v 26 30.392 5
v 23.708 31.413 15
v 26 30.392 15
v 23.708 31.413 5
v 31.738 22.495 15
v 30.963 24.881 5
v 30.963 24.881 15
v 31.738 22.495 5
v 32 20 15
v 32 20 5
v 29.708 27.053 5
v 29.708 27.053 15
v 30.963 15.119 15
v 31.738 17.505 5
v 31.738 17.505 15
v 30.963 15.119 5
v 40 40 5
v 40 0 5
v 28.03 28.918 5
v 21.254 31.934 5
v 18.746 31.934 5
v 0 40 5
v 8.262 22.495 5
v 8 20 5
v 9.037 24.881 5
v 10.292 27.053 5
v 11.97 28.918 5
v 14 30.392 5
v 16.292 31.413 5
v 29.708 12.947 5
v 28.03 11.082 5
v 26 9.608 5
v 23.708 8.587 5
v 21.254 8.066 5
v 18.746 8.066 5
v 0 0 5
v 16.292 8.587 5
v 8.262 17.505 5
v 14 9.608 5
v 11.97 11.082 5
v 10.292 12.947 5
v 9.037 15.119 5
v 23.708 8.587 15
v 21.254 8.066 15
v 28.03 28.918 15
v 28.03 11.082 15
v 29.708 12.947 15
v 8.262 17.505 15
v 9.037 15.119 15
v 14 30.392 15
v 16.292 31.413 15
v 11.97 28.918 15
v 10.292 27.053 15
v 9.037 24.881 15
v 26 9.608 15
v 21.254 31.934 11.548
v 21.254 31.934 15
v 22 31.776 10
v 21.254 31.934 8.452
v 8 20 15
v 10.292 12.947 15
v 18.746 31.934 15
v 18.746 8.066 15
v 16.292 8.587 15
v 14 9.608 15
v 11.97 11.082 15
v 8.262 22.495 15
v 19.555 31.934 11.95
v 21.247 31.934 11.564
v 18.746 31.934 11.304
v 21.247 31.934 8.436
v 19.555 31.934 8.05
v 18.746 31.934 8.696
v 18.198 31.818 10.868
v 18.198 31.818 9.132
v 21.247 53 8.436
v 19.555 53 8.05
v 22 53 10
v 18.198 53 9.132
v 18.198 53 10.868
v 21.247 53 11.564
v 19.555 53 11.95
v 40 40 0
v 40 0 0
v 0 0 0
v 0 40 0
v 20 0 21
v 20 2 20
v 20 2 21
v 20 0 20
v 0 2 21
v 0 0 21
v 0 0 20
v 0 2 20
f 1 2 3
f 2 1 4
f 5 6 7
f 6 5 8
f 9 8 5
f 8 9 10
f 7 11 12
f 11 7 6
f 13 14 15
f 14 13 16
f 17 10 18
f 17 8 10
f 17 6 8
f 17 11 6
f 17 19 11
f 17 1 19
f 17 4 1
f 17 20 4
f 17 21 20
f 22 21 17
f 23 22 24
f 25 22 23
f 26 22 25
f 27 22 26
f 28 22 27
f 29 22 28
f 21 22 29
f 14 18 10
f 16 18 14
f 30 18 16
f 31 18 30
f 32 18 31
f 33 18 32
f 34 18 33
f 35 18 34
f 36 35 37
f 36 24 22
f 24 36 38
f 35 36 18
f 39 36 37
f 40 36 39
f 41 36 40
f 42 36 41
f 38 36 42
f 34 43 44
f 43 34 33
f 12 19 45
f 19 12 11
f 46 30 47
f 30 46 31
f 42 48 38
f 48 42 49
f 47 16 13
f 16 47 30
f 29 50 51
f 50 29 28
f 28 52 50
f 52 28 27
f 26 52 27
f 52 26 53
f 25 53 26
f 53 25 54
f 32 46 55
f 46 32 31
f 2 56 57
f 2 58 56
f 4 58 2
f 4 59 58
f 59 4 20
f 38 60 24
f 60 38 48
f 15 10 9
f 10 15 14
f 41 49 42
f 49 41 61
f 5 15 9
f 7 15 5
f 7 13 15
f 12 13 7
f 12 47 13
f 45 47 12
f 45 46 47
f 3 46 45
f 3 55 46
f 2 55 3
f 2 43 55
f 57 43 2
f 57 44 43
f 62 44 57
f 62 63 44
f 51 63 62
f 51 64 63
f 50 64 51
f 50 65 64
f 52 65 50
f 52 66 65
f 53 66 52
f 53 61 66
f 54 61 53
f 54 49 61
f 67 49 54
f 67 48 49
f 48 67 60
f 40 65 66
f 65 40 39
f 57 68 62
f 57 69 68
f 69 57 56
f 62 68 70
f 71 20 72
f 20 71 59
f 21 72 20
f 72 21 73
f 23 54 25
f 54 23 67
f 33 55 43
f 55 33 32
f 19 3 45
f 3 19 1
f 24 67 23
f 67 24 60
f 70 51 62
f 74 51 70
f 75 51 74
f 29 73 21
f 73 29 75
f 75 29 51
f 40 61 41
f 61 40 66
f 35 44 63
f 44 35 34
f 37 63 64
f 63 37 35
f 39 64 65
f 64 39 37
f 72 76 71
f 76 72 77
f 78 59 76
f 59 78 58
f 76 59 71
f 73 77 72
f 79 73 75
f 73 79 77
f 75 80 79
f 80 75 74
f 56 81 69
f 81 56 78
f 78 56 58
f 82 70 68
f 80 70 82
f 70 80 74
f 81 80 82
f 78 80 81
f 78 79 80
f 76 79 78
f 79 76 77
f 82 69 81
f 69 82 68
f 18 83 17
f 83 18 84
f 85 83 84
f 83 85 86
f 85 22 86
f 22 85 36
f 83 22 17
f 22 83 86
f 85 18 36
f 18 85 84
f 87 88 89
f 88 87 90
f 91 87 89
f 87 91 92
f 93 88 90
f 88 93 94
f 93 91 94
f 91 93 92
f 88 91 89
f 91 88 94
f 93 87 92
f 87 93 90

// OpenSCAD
// $t, the animation's time: each golden is this file at one time.
echo(t = $t);
module blade(angle = 360 * $t) rotate([0, 0, angle]) cube([20, 2, 1]);
cube([40, 40, 5]);
translate([20, 20, 5]) rotate([0, 0, 360 * $t]) {
    cylinder(h = 10, r = 12);
    translate([0, 8, 5 + 3 * sin(360 * $t)]) rotate([-90, 0, 0]) cylinder(h = 25, r = 2);
}
translate([0, 0, 20]) blade();
if ($t >= 0.5) translate([60, 0, 0]) sphere(5);
